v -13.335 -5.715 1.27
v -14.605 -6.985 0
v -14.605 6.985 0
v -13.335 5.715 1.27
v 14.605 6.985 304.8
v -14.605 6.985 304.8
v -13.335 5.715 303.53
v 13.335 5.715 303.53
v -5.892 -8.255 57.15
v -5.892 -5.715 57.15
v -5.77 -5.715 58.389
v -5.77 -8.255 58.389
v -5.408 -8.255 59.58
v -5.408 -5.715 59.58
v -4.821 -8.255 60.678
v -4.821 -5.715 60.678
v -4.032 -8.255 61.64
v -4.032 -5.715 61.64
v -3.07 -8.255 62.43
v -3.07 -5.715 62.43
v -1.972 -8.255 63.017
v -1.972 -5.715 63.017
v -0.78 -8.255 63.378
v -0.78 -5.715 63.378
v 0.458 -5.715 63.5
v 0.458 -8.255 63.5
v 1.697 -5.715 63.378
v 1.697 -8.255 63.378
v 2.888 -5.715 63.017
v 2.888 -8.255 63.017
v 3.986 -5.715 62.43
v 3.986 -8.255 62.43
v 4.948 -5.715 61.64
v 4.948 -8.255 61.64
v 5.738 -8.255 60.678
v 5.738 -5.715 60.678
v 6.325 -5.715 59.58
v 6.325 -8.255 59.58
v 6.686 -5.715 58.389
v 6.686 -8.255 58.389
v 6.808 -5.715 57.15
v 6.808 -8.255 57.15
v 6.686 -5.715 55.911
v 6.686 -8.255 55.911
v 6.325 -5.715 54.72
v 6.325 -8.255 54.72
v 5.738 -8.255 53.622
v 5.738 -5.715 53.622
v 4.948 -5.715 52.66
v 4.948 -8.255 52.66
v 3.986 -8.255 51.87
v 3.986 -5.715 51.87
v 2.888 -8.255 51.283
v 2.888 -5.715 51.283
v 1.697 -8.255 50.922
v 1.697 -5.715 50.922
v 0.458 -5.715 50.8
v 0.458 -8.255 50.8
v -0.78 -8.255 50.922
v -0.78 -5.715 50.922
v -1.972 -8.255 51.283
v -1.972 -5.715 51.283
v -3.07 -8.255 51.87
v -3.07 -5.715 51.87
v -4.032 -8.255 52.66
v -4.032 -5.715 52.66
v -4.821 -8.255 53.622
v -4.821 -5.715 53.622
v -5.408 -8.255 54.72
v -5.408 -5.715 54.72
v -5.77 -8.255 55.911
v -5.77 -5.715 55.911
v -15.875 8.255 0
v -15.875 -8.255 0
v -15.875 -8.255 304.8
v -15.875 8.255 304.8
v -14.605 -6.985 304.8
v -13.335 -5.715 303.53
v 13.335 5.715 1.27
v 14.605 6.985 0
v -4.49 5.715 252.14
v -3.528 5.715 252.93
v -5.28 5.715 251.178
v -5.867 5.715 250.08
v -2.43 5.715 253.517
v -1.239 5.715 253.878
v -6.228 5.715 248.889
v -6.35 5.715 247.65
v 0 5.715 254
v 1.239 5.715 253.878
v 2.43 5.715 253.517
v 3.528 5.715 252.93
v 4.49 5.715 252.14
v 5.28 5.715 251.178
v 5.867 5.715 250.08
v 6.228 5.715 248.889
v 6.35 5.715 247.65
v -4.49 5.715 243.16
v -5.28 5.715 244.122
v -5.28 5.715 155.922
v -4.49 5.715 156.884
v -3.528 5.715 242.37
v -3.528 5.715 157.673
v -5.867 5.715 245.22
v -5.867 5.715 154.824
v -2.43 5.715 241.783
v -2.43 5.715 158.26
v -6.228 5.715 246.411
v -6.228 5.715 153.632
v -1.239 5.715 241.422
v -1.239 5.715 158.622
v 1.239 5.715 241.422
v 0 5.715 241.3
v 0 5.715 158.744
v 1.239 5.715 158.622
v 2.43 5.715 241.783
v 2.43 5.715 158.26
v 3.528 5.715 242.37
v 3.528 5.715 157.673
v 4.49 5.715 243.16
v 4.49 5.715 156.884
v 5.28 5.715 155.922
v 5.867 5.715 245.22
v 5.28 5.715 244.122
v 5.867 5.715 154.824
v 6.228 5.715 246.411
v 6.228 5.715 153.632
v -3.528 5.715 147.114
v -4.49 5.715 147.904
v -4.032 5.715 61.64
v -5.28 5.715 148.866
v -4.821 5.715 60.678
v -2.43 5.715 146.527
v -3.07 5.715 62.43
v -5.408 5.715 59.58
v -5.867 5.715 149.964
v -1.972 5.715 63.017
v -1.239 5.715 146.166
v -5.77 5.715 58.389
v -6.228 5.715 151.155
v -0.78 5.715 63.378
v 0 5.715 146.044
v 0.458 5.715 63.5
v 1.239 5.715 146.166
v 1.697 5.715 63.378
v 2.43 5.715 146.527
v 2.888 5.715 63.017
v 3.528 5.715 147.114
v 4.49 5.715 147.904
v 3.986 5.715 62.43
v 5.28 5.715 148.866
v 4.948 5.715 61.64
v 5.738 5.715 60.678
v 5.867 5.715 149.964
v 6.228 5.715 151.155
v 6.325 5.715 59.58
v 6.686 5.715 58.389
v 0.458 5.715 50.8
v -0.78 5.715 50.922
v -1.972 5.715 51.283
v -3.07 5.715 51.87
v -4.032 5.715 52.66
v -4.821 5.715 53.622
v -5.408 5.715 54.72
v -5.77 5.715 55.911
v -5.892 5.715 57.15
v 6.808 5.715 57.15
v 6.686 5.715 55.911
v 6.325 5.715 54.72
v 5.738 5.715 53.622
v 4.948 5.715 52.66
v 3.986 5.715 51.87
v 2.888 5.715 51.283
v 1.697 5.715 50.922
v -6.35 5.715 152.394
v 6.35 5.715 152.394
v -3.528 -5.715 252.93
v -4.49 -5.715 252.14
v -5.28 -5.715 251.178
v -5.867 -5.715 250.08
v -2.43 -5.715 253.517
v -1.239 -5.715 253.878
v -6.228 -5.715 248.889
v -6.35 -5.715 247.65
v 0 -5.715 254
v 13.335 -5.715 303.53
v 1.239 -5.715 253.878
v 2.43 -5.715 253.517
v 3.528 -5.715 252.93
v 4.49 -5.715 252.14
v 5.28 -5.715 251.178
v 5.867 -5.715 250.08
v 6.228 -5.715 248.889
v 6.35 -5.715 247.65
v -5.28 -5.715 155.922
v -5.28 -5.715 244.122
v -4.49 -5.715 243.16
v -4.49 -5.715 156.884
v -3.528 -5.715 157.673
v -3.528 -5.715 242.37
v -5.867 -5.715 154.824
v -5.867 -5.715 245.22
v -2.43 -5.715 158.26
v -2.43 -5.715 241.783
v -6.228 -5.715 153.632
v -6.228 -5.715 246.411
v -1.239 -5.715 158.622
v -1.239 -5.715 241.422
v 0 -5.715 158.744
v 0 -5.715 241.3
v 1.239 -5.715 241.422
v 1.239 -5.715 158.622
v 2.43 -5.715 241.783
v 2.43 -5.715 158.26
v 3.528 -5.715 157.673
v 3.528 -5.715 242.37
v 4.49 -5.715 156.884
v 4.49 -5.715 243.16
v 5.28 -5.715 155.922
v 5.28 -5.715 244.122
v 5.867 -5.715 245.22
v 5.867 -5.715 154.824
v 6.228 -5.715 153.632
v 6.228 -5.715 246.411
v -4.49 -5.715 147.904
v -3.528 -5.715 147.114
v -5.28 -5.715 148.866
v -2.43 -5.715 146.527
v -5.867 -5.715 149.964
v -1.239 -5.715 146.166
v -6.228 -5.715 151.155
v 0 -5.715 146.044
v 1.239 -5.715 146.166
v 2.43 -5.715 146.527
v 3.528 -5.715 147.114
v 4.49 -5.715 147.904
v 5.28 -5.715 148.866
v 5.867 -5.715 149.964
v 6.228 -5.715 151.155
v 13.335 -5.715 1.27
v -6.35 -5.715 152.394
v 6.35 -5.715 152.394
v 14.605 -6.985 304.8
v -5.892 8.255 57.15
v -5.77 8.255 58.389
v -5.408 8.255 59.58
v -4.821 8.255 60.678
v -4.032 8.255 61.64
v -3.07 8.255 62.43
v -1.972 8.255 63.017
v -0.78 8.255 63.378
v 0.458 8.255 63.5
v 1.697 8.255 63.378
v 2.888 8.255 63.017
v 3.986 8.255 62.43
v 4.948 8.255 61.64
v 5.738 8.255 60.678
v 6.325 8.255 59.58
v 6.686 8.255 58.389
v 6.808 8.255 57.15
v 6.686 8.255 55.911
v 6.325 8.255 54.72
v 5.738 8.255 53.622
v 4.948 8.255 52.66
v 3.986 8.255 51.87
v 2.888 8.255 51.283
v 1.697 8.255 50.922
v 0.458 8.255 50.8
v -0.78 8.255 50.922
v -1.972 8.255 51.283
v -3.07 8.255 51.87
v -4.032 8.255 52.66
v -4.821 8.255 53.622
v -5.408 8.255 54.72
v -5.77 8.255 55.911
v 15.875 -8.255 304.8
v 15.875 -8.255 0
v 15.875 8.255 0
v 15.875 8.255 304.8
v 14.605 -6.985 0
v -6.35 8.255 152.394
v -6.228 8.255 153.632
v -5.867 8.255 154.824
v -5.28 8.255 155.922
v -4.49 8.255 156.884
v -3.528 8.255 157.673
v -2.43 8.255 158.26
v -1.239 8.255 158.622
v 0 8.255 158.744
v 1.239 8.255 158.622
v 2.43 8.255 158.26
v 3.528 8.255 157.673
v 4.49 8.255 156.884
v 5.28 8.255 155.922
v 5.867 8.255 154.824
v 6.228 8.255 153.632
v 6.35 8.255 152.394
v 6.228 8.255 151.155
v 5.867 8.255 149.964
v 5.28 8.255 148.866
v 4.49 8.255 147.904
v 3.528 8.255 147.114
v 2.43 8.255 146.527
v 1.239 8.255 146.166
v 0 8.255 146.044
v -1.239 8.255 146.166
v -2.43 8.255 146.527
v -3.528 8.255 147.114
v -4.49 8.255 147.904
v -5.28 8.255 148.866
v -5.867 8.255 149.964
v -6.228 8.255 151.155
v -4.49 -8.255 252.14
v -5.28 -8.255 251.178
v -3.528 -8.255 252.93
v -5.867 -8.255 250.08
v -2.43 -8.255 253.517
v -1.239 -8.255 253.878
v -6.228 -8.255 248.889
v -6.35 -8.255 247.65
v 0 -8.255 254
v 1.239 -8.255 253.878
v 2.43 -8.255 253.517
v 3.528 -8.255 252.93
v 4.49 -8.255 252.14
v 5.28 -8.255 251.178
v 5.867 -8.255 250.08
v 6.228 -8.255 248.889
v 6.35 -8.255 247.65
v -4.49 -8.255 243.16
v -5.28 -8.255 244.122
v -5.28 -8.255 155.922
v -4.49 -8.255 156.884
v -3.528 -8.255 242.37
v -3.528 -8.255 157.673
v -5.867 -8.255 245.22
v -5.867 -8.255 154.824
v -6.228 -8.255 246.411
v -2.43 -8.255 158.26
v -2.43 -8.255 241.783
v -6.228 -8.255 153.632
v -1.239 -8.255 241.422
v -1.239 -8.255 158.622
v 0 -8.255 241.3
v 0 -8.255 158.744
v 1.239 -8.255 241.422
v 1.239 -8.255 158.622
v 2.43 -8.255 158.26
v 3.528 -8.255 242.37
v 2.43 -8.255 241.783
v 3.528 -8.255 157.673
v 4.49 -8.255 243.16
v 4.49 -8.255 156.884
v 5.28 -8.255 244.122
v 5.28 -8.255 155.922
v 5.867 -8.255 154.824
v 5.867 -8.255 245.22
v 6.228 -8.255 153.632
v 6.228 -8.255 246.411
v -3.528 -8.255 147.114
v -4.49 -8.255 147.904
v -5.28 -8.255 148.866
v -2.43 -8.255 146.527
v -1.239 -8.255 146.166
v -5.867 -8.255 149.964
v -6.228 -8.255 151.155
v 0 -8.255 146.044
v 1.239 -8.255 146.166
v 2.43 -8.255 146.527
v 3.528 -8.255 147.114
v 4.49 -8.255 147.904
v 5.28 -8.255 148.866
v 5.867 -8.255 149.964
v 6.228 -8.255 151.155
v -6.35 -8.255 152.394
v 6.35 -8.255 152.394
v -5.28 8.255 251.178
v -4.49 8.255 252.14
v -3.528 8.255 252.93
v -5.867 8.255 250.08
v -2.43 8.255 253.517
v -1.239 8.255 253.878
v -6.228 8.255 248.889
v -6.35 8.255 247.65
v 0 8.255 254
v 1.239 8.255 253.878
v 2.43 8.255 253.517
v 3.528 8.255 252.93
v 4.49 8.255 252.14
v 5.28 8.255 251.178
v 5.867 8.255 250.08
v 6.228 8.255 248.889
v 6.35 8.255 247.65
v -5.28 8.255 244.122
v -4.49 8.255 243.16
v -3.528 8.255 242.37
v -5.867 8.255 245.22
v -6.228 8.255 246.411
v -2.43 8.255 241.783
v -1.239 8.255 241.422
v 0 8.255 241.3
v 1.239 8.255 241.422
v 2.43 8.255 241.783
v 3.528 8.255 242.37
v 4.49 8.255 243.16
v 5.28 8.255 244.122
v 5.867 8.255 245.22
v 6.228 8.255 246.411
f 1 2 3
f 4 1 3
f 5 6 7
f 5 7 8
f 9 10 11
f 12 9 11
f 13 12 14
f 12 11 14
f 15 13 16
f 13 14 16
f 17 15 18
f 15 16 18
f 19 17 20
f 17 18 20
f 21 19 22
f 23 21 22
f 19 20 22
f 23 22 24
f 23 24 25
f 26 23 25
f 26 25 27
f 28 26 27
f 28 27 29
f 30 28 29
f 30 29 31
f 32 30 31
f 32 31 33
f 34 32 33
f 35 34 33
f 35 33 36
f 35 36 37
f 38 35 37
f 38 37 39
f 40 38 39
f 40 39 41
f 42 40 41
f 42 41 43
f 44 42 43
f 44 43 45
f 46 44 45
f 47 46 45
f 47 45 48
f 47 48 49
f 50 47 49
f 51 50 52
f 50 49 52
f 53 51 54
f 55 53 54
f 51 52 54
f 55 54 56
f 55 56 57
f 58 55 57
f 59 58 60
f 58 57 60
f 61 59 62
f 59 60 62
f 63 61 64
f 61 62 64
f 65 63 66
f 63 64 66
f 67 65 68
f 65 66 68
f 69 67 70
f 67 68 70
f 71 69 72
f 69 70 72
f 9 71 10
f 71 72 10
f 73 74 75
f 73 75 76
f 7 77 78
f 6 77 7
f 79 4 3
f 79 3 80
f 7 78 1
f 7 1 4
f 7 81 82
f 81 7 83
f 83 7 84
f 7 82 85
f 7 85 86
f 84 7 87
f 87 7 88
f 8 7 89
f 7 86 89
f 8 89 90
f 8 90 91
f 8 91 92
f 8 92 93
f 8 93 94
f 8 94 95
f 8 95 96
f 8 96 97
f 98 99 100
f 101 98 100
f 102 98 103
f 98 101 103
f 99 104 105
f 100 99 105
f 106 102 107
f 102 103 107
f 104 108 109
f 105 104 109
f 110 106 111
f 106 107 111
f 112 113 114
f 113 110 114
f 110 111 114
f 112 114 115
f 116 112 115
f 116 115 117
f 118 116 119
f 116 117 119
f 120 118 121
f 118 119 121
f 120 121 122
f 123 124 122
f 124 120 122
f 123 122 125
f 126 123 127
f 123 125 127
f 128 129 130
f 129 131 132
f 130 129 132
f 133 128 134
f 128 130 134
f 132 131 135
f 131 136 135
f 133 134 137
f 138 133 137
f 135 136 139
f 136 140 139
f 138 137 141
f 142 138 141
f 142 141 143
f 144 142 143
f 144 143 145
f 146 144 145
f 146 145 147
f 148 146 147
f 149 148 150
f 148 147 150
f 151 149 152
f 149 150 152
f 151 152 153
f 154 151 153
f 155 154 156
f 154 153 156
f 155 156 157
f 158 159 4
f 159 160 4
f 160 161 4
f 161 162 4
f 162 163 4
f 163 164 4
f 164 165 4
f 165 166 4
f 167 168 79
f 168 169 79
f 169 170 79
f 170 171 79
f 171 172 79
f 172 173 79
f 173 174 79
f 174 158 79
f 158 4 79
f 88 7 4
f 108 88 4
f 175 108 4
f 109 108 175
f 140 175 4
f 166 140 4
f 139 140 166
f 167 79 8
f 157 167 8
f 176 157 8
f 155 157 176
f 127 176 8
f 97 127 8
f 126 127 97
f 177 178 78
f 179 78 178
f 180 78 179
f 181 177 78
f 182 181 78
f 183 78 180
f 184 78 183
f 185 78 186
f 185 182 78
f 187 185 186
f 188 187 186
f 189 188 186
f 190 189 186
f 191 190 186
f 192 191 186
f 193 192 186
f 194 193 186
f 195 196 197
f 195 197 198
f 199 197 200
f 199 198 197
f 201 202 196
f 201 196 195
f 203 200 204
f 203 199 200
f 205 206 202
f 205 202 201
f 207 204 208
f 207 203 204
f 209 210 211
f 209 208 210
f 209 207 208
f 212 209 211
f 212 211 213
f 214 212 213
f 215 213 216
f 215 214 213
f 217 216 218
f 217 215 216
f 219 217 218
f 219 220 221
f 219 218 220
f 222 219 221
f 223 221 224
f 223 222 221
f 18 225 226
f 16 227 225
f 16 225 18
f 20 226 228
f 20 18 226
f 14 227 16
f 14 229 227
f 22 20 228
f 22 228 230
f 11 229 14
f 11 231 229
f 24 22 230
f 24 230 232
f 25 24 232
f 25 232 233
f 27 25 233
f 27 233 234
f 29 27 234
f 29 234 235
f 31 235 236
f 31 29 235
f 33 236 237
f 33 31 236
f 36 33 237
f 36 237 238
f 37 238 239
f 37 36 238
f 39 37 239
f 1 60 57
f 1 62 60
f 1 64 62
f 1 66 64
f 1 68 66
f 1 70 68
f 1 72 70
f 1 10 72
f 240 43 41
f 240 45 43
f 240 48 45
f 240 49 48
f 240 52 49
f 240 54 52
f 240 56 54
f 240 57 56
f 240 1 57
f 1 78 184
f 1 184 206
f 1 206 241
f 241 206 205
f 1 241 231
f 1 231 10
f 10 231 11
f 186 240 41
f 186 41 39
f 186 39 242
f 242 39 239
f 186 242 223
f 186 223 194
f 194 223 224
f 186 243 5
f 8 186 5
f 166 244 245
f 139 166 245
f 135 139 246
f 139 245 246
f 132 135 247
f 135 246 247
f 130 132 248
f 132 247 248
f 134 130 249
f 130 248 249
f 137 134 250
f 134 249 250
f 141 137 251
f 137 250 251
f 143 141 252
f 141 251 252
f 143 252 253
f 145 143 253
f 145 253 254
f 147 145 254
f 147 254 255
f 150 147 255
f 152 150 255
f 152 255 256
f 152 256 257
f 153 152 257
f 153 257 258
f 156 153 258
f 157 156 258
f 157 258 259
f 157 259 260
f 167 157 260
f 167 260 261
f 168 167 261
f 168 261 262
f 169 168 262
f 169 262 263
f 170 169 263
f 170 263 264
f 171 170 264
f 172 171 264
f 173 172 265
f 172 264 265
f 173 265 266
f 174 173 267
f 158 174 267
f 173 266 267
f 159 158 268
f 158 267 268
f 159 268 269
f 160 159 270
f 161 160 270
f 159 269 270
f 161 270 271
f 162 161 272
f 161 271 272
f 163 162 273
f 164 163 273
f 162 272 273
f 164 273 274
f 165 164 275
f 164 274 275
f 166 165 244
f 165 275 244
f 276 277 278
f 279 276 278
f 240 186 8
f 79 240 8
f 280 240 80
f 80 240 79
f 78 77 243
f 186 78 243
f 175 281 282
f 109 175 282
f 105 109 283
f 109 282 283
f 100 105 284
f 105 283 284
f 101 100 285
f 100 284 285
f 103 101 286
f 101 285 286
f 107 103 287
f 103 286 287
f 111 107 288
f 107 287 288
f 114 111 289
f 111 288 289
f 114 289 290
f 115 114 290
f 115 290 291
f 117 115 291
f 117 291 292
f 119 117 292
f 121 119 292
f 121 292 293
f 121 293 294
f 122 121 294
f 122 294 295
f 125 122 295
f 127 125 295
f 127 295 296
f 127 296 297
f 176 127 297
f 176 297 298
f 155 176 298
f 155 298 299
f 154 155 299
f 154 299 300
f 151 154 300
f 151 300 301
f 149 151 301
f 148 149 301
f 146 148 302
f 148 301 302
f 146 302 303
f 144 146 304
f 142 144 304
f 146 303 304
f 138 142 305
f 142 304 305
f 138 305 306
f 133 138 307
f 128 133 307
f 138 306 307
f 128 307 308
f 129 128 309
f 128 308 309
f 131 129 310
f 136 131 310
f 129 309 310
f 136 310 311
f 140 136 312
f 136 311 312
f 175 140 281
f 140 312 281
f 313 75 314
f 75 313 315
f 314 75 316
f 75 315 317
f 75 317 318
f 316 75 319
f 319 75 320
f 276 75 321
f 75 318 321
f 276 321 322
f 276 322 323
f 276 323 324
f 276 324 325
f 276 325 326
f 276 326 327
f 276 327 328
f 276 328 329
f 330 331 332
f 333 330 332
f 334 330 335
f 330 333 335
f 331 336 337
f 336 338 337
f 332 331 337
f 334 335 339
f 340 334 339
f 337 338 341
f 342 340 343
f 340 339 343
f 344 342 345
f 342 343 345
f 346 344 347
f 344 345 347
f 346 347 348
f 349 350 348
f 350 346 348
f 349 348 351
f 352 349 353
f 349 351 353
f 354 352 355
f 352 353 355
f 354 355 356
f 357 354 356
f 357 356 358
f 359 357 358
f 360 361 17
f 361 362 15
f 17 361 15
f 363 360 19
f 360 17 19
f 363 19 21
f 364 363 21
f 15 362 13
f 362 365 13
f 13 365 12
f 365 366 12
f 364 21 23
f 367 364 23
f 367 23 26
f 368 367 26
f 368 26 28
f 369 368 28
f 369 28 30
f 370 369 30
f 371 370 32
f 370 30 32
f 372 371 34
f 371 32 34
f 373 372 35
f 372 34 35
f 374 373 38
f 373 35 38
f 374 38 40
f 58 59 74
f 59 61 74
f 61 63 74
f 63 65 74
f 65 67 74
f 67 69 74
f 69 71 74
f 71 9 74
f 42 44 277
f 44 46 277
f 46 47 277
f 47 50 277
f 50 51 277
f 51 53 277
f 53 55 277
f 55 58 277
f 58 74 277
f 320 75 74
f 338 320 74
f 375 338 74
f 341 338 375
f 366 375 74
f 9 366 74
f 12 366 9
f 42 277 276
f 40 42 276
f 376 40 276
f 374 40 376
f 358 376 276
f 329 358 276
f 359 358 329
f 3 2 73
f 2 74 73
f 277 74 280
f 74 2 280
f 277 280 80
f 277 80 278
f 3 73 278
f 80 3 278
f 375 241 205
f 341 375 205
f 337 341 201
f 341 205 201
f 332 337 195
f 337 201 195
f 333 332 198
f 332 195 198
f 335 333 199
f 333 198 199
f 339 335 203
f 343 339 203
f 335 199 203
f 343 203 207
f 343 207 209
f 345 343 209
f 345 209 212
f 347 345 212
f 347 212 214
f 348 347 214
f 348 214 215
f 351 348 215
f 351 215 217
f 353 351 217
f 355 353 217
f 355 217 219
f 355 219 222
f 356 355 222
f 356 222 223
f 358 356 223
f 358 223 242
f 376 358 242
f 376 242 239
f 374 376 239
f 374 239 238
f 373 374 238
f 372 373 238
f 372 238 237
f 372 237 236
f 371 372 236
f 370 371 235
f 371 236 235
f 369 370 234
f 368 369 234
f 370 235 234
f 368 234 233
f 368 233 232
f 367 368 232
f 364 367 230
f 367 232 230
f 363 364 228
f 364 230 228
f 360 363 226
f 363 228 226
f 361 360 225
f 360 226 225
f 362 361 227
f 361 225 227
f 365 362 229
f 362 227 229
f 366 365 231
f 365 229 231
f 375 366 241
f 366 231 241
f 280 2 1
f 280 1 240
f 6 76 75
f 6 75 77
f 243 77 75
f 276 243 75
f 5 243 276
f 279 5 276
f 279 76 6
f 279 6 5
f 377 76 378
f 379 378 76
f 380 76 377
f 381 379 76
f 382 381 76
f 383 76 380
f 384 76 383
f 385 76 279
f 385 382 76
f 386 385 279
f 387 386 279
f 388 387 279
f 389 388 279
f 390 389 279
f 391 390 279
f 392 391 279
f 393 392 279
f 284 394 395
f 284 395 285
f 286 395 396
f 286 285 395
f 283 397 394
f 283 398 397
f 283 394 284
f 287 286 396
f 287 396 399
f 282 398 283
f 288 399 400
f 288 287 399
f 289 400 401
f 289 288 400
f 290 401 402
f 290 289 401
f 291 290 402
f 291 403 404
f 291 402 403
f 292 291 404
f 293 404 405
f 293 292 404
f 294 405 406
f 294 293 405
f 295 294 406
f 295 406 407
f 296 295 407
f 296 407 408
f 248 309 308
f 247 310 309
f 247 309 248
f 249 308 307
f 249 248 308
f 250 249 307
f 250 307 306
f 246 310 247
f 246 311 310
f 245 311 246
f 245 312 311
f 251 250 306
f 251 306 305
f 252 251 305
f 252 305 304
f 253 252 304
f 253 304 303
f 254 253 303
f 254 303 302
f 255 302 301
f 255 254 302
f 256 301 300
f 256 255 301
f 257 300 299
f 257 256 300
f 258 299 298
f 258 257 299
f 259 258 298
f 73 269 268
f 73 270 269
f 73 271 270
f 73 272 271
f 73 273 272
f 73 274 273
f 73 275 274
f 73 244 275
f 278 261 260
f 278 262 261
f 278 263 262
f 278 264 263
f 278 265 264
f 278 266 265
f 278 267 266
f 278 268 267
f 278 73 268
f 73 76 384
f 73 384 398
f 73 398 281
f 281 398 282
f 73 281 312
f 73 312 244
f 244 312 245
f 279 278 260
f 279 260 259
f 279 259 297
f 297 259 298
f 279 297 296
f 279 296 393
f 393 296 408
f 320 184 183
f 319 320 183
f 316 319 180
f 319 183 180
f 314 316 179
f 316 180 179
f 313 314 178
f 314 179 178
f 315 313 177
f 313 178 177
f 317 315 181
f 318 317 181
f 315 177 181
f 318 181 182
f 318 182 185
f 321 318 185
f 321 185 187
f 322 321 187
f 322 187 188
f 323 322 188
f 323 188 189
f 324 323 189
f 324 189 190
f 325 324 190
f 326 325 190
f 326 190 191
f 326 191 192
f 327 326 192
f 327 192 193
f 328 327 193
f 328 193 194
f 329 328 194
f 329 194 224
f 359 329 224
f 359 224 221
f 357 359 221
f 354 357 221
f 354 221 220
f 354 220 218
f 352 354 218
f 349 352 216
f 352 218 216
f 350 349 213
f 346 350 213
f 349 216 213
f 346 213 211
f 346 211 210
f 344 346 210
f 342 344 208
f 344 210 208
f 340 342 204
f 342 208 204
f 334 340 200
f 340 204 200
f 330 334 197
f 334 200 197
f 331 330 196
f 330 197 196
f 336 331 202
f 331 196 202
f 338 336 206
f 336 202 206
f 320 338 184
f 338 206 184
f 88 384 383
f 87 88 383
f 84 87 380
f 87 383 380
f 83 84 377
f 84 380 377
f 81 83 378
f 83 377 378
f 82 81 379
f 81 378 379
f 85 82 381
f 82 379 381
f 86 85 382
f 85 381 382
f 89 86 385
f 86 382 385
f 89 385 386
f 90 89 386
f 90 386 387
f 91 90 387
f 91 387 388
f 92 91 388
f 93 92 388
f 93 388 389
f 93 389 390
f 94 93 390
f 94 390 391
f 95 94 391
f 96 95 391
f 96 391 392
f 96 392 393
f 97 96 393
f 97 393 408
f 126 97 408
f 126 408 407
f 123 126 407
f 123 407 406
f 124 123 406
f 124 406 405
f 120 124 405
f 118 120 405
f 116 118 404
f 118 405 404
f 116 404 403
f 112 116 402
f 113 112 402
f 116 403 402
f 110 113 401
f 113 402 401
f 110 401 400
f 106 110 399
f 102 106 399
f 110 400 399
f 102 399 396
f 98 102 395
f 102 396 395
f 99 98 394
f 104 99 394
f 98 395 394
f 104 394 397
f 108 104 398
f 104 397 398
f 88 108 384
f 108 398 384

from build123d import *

# Parameters (mm, degrees)
F0_W     = 31.75
F0_H     = 16.51
F0_W_2   = 26.67
F0_H_2   = 11.43
F1_DEPTH = 304.8
F2_SIZE  = 1.27
F3_SIZE  = 1.27
F5_D     = 12.7
F5_DEPTH = 25.4


with BuildPart() as f1:
    # F0 (on Top) → F1 (new body)
    with BuildSketch(Plane.XY):
        Rectangle(F0_W, F0_H)
        Rectangle(F0_W_2, F0_H_2, mode=Mode.SUBTRACT)
    extrude(amount=F1_DEPTH)

    # F2
    f2_edges = [f1.edges().sort_by_distance(p)[0] for p in [
        (0, 5.715, 304.8),
        (-13.335, 0, 304.8),
        (0, -5.715, 304.8),
        (13.335, 0, 304.8),
    ]]
    chamfer(f2_edges, length=F2_SIZE)

    # F3
    f3_edges = [f1.edges().sort_by_distance(p)[0] for p in [
        (13.335, 0, 0),
        (0, 5.715, 0),
        (-13.335, 0, 0),
        (0, -5.715, 0),
    ]]
    chamfer(f3_edges, length=F3_SIZE)

    # F5
    with Locations(Plane.XZ.offset(8.255)):
        with Locations((0, 152.39365), (0, 247.65), (0.458365, 57.15)):
            Hole(F5_D / 2, depth=F5_DEPTH)


solid = f1.part
